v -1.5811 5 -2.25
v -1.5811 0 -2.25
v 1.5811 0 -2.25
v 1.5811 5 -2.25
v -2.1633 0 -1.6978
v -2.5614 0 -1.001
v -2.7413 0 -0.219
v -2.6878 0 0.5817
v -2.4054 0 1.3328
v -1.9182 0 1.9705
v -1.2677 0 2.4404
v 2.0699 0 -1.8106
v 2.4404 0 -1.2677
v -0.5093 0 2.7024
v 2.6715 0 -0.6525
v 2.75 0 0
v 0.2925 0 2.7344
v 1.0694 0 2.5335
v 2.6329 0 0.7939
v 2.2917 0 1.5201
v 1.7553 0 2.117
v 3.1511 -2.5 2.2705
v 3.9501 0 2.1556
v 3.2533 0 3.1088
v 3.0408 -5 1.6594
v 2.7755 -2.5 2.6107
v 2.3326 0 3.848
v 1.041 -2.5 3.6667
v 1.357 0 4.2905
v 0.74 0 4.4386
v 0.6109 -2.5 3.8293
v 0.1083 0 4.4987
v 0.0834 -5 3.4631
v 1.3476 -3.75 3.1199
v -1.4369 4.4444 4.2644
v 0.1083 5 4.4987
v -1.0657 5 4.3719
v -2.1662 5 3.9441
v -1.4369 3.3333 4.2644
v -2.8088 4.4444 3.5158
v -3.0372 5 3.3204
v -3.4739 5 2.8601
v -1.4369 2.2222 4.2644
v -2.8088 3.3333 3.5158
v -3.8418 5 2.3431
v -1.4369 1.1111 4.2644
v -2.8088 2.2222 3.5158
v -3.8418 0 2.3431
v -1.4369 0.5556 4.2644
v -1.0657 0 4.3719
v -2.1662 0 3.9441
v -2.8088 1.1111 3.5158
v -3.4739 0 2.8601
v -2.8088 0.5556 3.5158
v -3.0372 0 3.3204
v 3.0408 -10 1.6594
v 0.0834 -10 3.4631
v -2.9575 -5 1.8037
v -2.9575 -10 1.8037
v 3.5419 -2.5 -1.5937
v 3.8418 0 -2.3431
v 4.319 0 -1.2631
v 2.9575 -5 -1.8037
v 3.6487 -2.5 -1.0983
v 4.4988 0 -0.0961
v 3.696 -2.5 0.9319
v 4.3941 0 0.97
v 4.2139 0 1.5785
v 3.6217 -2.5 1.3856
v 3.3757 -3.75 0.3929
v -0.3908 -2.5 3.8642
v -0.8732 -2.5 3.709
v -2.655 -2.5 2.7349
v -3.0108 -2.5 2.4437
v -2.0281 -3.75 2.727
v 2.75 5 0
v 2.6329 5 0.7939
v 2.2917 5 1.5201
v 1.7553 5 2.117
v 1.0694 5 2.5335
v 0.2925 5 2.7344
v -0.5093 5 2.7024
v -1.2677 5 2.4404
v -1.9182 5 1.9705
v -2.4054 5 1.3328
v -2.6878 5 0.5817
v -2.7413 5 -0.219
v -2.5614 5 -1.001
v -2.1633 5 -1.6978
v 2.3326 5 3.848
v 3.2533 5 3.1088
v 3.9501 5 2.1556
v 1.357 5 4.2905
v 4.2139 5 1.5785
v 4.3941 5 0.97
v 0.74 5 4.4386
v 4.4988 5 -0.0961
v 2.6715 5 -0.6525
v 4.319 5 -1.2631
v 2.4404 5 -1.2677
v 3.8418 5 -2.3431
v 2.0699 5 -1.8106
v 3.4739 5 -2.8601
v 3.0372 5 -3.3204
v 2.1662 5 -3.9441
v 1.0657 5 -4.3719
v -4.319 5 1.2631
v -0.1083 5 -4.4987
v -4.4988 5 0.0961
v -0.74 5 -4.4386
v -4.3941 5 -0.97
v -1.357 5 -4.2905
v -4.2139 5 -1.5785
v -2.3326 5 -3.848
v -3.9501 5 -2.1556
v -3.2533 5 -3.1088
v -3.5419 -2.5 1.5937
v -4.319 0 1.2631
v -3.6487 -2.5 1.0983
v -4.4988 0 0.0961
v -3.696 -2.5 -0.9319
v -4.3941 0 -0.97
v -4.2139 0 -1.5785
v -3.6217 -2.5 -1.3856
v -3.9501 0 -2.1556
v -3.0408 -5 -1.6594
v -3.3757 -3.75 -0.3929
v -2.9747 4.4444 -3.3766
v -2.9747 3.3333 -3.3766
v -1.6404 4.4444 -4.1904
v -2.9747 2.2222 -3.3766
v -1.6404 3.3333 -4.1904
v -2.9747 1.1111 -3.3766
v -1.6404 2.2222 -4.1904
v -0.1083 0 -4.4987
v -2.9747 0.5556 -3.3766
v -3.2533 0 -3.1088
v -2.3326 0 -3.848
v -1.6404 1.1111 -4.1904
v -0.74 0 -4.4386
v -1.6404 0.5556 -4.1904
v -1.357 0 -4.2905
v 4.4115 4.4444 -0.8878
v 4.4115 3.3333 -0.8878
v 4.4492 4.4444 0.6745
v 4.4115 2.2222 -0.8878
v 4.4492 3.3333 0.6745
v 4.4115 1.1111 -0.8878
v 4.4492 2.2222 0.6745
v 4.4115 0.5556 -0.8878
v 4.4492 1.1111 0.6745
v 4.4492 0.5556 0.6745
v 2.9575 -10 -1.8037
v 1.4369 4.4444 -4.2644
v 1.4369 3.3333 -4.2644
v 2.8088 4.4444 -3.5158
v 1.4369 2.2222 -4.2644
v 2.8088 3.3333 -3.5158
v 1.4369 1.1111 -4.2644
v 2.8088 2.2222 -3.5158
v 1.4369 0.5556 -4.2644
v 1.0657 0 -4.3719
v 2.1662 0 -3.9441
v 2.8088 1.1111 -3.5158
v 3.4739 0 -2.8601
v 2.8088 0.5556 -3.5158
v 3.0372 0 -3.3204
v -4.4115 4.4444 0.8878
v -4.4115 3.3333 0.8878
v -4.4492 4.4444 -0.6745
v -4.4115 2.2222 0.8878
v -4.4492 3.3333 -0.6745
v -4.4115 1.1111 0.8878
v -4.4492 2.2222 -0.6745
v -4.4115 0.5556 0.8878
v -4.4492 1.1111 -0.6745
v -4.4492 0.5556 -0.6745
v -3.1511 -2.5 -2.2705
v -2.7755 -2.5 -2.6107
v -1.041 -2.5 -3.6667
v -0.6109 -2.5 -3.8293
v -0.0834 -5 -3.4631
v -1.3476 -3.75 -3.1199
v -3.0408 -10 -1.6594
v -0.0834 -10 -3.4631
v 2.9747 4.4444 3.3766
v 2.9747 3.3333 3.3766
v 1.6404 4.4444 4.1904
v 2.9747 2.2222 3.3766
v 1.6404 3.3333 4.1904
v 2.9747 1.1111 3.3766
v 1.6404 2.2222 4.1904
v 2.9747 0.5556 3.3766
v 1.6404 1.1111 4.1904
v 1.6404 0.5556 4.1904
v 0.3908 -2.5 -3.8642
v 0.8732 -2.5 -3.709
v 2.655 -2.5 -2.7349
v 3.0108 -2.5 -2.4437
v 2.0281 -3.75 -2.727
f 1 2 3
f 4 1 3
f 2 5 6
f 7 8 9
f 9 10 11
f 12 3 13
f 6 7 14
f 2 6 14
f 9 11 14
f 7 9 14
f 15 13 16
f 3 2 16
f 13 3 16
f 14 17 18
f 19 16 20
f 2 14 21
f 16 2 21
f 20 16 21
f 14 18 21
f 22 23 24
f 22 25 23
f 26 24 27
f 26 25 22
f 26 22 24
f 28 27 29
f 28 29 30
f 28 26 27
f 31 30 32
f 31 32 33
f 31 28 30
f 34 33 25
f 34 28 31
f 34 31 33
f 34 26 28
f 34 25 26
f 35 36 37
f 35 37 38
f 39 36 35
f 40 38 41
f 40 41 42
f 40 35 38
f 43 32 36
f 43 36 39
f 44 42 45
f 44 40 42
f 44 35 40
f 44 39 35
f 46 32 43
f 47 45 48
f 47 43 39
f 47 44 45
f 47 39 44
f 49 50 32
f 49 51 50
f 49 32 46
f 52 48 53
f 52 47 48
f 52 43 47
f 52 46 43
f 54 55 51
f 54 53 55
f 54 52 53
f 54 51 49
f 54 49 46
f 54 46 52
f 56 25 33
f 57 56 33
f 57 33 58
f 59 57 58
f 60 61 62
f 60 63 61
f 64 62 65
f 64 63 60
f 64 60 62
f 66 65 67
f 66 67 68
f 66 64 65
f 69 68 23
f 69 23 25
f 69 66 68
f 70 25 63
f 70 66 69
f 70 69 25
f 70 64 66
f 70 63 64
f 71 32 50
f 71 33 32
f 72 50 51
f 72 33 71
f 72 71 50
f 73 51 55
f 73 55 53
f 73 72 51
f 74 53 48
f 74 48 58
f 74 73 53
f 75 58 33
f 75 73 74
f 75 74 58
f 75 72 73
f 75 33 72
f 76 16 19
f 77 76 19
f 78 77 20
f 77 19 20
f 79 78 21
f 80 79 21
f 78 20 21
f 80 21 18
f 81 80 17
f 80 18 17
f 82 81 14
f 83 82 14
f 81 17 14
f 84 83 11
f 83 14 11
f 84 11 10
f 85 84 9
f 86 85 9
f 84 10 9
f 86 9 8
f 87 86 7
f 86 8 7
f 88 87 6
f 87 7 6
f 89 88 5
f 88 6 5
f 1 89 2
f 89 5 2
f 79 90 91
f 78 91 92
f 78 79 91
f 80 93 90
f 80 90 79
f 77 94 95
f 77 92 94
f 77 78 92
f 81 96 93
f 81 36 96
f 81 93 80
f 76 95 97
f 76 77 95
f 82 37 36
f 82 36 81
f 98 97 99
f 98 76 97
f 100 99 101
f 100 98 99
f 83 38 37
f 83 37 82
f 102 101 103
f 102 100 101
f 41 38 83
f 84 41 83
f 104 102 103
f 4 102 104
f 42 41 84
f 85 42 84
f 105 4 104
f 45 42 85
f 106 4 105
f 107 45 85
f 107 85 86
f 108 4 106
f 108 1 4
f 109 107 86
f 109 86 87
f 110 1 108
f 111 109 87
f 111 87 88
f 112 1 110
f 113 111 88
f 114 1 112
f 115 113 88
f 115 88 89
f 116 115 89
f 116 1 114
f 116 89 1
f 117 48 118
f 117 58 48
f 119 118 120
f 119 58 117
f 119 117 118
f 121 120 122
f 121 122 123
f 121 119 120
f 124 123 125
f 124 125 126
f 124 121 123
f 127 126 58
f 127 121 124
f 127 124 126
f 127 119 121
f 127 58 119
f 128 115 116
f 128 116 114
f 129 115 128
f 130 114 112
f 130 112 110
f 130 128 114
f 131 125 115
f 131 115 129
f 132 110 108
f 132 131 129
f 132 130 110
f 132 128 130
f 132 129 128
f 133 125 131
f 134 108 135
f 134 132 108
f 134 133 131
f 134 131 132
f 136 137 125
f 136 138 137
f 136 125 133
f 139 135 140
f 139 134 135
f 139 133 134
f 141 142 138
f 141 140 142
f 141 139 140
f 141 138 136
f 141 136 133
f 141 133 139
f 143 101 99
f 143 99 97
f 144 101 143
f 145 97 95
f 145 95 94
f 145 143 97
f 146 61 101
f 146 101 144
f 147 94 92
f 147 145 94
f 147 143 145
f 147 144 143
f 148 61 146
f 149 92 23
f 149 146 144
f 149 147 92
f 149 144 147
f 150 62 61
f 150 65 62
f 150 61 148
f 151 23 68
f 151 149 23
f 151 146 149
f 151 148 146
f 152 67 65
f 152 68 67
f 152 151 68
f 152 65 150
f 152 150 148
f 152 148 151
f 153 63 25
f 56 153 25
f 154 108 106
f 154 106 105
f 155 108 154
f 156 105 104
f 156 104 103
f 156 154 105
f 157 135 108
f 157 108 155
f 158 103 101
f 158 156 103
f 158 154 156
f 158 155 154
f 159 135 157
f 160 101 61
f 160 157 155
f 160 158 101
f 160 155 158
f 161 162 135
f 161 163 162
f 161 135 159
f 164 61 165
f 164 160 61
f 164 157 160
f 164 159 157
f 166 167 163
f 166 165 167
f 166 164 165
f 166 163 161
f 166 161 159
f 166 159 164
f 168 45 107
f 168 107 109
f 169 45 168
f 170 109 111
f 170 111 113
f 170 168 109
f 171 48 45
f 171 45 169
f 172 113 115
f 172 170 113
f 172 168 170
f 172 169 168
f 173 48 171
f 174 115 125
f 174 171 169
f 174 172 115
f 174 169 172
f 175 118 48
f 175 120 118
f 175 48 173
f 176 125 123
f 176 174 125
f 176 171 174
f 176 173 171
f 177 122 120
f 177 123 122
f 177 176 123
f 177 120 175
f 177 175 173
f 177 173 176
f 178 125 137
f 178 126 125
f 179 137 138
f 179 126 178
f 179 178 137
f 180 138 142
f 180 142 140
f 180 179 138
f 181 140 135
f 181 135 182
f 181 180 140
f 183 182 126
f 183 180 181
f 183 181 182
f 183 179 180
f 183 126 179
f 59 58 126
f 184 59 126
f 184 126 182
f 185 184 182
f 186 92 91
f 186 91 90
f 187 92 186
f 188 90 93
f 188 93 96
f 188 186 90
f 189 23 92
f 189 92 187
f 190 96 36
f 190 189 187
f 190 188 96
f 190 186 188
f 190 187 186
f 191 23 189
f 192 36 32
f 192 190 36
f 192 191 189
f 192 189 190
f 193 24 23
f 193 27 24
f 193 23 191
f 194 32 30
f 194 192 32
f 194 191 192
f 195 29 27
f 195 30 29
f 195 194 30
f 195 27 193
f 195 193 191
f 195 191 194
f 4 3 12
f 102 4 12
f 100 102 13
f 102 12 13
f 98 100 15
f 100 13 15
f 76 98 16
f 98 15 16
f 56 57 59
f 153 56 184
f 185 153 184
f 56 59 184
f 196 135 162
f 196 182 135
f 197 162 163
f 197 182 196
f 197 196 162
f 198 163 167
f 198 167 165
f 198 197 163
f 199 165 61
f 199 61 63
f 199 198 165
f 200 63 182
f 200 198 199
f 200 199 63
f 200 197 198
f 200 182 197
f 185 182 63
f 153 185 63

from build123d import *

# Parameters (mm, degrees)
F4_DEPTH = 5
F5_DEPTH = 5
F7_DEPTH = 5


# Not quite as in the source:
# - the arcs of a loft's sections are written as splines that run evenly, so that the points pair up as in the source's solid


with BuildPart() as f3:
    # F0 (on Front) → F3 section 0
    with BuildSketch(Plane.XZ):
        with BuildLine():
            add(Edge.make_bspline(
                [(3.8418426736, -2.3431271565), (4.1144778981, -1.8961084632), (4.3082439854, -1.4011386227), (4.5148518075, -0.3745248107), (4.5276427142, 0.1568666009), (4.3706679569, 1.1922320614), (4.2009409107, 1.6959513974), (3.9501289786, 2.1555697744)],
                knots=[0, 0, 0, 0, 0.3333333333, 0.3333333333, 0.6666666667, 0.6666666667, 1, 1, 1, 1], degree=3))
            add(Edge.make_bspline(
                [(3.9501289786, 2.1555697744), (3.6993170465, 2.6151881514), (3.3675436342, 3.0304794257), (2.5817739042, 3.7227139543), (2.1279708957, 3.9994869102), (1.1528307261, 4.3812255129), (0.6317334617, 4.4860972472), (0.1082863051, 4.4986969309)],
                knots=[0, 0, 0, 0, 0.3333333333, 0.3333333333, 0.6666666667, 0.6666666667, 1, 1, 1, 1], degree=3))
            add(Edge.make_bspline(
                [(0.1082863051, 4.4986969309), (-0.4151608516, 4.5112966146), (-0.9407003512, 4.4316180484), (-1.9330779034, 4.097238765), (-2.3996718185, 3.8426203093), (-3.2178372309, 3.1889934515), (-3.5692074491, 2.7901458498), (-3.8418426736, 2.3431271565)],
                knots=[0, 0, 0, 0, 0.3333333333, 0.3333333333, 0.6666666667, 0.6666666667, 1, 1, 1, 1], degree=3))
            add(Edge.make_bspline(
                [(-3.8418426736, 2.3431271565), (-4.1144778981, 1.8961084632), (-4.3082439854, 1.4011386227), (-4.5148518075, 0.3745248107), (-4.5276427142, -0.1568666009), (-4.3706679569, -1.1922320614), (-4.2009409107, -1.6959513974), (-3.9501289786, -2.1555697744)],
                knots=[0, 0, 0, 0, 0.3333333333, 0.3333333333, 0.6666666667, 0.6666666667, 1, 1, 1, 1], degree=3))
            add(Edge.make_bspline(
                [(-3.9501289786, -2.1555697744), (-3.6993170465, -2.6151881514), (-3.3675436342, -3.0304794257), (-2.5817739042, -3.7227139543), (-2.1279708957, -3.9994869102), (-1.1528307261, -4.3812255129), (-0.6317334617, -4.4860972472), (-0.1082863051, -4.4986969309)],
                knots=[0, 0, 0, 0, 0.3333333333, 0.3333333333, 0.6666666667, 0.6666666667, 1, 1, 1, 1], degree=3))
            add(Edge.make_bspline(
                [(-0.1082863051, -4.4986969309), (0.4151608516, -4.5112966146), (0.9407003512, -4.4316180484), (1.9330779034, -4.097238765), (2.3996718185, -3.8426203093), (3.2178372309, -3.1889934515), (3.5692074491, -2.7901458498), (3.8418426736, -2.3431271565)],
                knots=[0, 0, 0, 0, 0.3333333333, 0.3333333333, 0.6666666667, 0.6666666667, 1, 1, 1, 1], degree=3))
        make_face()
    # F2 (on offset) → F3 section 1
    with BuildSketch(Plane.XZ.offset(5)):
        Polygon((2.957451869, -1.8037401261), (3.0408107055, 1.659358386), (0.0833588365, 3.4630985121), (-2.957451869, 1.8037401261), (-3.0408107055, -1.659358386), (-0.0833588365, -3.4630985121), align=None)
    loft(ruled=True)

    # F4 (add): a face of the model
    f4_faces = [f3.faces().sort_by_distance(p)[0] for p in [
        (0, 0, 0),
    ]]
    extrude(f4_faces, amount=F4_DEPTH)

    # F5 (add): a face of the model
    f5_faces = [f3.faces().sort_by_distance(p)[0] for p in [
        (0, -5, 0),
    ]]
    extrude(f5_faces, amount=F5_DEPTH)

    # F6 (on Front) → F7 (cut)
    with BuildSketch(Plane.XZ):
        with BuildLine():
            ThreePointArc((1.5811388301, -2.25), (2.4403515918, -1.2677476518), (2.75, 0))
            ThreePointArc((2.75, 0), (-1.2677476518, 2.4403515918), (-1.5811388301, -2.25))
            Line((-1.5811388301, -2.25), (1.5811388301, -2.25))
        make_face()
    extrude(amount=-F7_DEPTH, mode=Mode.SUBTRACT)


solid = f3.part
